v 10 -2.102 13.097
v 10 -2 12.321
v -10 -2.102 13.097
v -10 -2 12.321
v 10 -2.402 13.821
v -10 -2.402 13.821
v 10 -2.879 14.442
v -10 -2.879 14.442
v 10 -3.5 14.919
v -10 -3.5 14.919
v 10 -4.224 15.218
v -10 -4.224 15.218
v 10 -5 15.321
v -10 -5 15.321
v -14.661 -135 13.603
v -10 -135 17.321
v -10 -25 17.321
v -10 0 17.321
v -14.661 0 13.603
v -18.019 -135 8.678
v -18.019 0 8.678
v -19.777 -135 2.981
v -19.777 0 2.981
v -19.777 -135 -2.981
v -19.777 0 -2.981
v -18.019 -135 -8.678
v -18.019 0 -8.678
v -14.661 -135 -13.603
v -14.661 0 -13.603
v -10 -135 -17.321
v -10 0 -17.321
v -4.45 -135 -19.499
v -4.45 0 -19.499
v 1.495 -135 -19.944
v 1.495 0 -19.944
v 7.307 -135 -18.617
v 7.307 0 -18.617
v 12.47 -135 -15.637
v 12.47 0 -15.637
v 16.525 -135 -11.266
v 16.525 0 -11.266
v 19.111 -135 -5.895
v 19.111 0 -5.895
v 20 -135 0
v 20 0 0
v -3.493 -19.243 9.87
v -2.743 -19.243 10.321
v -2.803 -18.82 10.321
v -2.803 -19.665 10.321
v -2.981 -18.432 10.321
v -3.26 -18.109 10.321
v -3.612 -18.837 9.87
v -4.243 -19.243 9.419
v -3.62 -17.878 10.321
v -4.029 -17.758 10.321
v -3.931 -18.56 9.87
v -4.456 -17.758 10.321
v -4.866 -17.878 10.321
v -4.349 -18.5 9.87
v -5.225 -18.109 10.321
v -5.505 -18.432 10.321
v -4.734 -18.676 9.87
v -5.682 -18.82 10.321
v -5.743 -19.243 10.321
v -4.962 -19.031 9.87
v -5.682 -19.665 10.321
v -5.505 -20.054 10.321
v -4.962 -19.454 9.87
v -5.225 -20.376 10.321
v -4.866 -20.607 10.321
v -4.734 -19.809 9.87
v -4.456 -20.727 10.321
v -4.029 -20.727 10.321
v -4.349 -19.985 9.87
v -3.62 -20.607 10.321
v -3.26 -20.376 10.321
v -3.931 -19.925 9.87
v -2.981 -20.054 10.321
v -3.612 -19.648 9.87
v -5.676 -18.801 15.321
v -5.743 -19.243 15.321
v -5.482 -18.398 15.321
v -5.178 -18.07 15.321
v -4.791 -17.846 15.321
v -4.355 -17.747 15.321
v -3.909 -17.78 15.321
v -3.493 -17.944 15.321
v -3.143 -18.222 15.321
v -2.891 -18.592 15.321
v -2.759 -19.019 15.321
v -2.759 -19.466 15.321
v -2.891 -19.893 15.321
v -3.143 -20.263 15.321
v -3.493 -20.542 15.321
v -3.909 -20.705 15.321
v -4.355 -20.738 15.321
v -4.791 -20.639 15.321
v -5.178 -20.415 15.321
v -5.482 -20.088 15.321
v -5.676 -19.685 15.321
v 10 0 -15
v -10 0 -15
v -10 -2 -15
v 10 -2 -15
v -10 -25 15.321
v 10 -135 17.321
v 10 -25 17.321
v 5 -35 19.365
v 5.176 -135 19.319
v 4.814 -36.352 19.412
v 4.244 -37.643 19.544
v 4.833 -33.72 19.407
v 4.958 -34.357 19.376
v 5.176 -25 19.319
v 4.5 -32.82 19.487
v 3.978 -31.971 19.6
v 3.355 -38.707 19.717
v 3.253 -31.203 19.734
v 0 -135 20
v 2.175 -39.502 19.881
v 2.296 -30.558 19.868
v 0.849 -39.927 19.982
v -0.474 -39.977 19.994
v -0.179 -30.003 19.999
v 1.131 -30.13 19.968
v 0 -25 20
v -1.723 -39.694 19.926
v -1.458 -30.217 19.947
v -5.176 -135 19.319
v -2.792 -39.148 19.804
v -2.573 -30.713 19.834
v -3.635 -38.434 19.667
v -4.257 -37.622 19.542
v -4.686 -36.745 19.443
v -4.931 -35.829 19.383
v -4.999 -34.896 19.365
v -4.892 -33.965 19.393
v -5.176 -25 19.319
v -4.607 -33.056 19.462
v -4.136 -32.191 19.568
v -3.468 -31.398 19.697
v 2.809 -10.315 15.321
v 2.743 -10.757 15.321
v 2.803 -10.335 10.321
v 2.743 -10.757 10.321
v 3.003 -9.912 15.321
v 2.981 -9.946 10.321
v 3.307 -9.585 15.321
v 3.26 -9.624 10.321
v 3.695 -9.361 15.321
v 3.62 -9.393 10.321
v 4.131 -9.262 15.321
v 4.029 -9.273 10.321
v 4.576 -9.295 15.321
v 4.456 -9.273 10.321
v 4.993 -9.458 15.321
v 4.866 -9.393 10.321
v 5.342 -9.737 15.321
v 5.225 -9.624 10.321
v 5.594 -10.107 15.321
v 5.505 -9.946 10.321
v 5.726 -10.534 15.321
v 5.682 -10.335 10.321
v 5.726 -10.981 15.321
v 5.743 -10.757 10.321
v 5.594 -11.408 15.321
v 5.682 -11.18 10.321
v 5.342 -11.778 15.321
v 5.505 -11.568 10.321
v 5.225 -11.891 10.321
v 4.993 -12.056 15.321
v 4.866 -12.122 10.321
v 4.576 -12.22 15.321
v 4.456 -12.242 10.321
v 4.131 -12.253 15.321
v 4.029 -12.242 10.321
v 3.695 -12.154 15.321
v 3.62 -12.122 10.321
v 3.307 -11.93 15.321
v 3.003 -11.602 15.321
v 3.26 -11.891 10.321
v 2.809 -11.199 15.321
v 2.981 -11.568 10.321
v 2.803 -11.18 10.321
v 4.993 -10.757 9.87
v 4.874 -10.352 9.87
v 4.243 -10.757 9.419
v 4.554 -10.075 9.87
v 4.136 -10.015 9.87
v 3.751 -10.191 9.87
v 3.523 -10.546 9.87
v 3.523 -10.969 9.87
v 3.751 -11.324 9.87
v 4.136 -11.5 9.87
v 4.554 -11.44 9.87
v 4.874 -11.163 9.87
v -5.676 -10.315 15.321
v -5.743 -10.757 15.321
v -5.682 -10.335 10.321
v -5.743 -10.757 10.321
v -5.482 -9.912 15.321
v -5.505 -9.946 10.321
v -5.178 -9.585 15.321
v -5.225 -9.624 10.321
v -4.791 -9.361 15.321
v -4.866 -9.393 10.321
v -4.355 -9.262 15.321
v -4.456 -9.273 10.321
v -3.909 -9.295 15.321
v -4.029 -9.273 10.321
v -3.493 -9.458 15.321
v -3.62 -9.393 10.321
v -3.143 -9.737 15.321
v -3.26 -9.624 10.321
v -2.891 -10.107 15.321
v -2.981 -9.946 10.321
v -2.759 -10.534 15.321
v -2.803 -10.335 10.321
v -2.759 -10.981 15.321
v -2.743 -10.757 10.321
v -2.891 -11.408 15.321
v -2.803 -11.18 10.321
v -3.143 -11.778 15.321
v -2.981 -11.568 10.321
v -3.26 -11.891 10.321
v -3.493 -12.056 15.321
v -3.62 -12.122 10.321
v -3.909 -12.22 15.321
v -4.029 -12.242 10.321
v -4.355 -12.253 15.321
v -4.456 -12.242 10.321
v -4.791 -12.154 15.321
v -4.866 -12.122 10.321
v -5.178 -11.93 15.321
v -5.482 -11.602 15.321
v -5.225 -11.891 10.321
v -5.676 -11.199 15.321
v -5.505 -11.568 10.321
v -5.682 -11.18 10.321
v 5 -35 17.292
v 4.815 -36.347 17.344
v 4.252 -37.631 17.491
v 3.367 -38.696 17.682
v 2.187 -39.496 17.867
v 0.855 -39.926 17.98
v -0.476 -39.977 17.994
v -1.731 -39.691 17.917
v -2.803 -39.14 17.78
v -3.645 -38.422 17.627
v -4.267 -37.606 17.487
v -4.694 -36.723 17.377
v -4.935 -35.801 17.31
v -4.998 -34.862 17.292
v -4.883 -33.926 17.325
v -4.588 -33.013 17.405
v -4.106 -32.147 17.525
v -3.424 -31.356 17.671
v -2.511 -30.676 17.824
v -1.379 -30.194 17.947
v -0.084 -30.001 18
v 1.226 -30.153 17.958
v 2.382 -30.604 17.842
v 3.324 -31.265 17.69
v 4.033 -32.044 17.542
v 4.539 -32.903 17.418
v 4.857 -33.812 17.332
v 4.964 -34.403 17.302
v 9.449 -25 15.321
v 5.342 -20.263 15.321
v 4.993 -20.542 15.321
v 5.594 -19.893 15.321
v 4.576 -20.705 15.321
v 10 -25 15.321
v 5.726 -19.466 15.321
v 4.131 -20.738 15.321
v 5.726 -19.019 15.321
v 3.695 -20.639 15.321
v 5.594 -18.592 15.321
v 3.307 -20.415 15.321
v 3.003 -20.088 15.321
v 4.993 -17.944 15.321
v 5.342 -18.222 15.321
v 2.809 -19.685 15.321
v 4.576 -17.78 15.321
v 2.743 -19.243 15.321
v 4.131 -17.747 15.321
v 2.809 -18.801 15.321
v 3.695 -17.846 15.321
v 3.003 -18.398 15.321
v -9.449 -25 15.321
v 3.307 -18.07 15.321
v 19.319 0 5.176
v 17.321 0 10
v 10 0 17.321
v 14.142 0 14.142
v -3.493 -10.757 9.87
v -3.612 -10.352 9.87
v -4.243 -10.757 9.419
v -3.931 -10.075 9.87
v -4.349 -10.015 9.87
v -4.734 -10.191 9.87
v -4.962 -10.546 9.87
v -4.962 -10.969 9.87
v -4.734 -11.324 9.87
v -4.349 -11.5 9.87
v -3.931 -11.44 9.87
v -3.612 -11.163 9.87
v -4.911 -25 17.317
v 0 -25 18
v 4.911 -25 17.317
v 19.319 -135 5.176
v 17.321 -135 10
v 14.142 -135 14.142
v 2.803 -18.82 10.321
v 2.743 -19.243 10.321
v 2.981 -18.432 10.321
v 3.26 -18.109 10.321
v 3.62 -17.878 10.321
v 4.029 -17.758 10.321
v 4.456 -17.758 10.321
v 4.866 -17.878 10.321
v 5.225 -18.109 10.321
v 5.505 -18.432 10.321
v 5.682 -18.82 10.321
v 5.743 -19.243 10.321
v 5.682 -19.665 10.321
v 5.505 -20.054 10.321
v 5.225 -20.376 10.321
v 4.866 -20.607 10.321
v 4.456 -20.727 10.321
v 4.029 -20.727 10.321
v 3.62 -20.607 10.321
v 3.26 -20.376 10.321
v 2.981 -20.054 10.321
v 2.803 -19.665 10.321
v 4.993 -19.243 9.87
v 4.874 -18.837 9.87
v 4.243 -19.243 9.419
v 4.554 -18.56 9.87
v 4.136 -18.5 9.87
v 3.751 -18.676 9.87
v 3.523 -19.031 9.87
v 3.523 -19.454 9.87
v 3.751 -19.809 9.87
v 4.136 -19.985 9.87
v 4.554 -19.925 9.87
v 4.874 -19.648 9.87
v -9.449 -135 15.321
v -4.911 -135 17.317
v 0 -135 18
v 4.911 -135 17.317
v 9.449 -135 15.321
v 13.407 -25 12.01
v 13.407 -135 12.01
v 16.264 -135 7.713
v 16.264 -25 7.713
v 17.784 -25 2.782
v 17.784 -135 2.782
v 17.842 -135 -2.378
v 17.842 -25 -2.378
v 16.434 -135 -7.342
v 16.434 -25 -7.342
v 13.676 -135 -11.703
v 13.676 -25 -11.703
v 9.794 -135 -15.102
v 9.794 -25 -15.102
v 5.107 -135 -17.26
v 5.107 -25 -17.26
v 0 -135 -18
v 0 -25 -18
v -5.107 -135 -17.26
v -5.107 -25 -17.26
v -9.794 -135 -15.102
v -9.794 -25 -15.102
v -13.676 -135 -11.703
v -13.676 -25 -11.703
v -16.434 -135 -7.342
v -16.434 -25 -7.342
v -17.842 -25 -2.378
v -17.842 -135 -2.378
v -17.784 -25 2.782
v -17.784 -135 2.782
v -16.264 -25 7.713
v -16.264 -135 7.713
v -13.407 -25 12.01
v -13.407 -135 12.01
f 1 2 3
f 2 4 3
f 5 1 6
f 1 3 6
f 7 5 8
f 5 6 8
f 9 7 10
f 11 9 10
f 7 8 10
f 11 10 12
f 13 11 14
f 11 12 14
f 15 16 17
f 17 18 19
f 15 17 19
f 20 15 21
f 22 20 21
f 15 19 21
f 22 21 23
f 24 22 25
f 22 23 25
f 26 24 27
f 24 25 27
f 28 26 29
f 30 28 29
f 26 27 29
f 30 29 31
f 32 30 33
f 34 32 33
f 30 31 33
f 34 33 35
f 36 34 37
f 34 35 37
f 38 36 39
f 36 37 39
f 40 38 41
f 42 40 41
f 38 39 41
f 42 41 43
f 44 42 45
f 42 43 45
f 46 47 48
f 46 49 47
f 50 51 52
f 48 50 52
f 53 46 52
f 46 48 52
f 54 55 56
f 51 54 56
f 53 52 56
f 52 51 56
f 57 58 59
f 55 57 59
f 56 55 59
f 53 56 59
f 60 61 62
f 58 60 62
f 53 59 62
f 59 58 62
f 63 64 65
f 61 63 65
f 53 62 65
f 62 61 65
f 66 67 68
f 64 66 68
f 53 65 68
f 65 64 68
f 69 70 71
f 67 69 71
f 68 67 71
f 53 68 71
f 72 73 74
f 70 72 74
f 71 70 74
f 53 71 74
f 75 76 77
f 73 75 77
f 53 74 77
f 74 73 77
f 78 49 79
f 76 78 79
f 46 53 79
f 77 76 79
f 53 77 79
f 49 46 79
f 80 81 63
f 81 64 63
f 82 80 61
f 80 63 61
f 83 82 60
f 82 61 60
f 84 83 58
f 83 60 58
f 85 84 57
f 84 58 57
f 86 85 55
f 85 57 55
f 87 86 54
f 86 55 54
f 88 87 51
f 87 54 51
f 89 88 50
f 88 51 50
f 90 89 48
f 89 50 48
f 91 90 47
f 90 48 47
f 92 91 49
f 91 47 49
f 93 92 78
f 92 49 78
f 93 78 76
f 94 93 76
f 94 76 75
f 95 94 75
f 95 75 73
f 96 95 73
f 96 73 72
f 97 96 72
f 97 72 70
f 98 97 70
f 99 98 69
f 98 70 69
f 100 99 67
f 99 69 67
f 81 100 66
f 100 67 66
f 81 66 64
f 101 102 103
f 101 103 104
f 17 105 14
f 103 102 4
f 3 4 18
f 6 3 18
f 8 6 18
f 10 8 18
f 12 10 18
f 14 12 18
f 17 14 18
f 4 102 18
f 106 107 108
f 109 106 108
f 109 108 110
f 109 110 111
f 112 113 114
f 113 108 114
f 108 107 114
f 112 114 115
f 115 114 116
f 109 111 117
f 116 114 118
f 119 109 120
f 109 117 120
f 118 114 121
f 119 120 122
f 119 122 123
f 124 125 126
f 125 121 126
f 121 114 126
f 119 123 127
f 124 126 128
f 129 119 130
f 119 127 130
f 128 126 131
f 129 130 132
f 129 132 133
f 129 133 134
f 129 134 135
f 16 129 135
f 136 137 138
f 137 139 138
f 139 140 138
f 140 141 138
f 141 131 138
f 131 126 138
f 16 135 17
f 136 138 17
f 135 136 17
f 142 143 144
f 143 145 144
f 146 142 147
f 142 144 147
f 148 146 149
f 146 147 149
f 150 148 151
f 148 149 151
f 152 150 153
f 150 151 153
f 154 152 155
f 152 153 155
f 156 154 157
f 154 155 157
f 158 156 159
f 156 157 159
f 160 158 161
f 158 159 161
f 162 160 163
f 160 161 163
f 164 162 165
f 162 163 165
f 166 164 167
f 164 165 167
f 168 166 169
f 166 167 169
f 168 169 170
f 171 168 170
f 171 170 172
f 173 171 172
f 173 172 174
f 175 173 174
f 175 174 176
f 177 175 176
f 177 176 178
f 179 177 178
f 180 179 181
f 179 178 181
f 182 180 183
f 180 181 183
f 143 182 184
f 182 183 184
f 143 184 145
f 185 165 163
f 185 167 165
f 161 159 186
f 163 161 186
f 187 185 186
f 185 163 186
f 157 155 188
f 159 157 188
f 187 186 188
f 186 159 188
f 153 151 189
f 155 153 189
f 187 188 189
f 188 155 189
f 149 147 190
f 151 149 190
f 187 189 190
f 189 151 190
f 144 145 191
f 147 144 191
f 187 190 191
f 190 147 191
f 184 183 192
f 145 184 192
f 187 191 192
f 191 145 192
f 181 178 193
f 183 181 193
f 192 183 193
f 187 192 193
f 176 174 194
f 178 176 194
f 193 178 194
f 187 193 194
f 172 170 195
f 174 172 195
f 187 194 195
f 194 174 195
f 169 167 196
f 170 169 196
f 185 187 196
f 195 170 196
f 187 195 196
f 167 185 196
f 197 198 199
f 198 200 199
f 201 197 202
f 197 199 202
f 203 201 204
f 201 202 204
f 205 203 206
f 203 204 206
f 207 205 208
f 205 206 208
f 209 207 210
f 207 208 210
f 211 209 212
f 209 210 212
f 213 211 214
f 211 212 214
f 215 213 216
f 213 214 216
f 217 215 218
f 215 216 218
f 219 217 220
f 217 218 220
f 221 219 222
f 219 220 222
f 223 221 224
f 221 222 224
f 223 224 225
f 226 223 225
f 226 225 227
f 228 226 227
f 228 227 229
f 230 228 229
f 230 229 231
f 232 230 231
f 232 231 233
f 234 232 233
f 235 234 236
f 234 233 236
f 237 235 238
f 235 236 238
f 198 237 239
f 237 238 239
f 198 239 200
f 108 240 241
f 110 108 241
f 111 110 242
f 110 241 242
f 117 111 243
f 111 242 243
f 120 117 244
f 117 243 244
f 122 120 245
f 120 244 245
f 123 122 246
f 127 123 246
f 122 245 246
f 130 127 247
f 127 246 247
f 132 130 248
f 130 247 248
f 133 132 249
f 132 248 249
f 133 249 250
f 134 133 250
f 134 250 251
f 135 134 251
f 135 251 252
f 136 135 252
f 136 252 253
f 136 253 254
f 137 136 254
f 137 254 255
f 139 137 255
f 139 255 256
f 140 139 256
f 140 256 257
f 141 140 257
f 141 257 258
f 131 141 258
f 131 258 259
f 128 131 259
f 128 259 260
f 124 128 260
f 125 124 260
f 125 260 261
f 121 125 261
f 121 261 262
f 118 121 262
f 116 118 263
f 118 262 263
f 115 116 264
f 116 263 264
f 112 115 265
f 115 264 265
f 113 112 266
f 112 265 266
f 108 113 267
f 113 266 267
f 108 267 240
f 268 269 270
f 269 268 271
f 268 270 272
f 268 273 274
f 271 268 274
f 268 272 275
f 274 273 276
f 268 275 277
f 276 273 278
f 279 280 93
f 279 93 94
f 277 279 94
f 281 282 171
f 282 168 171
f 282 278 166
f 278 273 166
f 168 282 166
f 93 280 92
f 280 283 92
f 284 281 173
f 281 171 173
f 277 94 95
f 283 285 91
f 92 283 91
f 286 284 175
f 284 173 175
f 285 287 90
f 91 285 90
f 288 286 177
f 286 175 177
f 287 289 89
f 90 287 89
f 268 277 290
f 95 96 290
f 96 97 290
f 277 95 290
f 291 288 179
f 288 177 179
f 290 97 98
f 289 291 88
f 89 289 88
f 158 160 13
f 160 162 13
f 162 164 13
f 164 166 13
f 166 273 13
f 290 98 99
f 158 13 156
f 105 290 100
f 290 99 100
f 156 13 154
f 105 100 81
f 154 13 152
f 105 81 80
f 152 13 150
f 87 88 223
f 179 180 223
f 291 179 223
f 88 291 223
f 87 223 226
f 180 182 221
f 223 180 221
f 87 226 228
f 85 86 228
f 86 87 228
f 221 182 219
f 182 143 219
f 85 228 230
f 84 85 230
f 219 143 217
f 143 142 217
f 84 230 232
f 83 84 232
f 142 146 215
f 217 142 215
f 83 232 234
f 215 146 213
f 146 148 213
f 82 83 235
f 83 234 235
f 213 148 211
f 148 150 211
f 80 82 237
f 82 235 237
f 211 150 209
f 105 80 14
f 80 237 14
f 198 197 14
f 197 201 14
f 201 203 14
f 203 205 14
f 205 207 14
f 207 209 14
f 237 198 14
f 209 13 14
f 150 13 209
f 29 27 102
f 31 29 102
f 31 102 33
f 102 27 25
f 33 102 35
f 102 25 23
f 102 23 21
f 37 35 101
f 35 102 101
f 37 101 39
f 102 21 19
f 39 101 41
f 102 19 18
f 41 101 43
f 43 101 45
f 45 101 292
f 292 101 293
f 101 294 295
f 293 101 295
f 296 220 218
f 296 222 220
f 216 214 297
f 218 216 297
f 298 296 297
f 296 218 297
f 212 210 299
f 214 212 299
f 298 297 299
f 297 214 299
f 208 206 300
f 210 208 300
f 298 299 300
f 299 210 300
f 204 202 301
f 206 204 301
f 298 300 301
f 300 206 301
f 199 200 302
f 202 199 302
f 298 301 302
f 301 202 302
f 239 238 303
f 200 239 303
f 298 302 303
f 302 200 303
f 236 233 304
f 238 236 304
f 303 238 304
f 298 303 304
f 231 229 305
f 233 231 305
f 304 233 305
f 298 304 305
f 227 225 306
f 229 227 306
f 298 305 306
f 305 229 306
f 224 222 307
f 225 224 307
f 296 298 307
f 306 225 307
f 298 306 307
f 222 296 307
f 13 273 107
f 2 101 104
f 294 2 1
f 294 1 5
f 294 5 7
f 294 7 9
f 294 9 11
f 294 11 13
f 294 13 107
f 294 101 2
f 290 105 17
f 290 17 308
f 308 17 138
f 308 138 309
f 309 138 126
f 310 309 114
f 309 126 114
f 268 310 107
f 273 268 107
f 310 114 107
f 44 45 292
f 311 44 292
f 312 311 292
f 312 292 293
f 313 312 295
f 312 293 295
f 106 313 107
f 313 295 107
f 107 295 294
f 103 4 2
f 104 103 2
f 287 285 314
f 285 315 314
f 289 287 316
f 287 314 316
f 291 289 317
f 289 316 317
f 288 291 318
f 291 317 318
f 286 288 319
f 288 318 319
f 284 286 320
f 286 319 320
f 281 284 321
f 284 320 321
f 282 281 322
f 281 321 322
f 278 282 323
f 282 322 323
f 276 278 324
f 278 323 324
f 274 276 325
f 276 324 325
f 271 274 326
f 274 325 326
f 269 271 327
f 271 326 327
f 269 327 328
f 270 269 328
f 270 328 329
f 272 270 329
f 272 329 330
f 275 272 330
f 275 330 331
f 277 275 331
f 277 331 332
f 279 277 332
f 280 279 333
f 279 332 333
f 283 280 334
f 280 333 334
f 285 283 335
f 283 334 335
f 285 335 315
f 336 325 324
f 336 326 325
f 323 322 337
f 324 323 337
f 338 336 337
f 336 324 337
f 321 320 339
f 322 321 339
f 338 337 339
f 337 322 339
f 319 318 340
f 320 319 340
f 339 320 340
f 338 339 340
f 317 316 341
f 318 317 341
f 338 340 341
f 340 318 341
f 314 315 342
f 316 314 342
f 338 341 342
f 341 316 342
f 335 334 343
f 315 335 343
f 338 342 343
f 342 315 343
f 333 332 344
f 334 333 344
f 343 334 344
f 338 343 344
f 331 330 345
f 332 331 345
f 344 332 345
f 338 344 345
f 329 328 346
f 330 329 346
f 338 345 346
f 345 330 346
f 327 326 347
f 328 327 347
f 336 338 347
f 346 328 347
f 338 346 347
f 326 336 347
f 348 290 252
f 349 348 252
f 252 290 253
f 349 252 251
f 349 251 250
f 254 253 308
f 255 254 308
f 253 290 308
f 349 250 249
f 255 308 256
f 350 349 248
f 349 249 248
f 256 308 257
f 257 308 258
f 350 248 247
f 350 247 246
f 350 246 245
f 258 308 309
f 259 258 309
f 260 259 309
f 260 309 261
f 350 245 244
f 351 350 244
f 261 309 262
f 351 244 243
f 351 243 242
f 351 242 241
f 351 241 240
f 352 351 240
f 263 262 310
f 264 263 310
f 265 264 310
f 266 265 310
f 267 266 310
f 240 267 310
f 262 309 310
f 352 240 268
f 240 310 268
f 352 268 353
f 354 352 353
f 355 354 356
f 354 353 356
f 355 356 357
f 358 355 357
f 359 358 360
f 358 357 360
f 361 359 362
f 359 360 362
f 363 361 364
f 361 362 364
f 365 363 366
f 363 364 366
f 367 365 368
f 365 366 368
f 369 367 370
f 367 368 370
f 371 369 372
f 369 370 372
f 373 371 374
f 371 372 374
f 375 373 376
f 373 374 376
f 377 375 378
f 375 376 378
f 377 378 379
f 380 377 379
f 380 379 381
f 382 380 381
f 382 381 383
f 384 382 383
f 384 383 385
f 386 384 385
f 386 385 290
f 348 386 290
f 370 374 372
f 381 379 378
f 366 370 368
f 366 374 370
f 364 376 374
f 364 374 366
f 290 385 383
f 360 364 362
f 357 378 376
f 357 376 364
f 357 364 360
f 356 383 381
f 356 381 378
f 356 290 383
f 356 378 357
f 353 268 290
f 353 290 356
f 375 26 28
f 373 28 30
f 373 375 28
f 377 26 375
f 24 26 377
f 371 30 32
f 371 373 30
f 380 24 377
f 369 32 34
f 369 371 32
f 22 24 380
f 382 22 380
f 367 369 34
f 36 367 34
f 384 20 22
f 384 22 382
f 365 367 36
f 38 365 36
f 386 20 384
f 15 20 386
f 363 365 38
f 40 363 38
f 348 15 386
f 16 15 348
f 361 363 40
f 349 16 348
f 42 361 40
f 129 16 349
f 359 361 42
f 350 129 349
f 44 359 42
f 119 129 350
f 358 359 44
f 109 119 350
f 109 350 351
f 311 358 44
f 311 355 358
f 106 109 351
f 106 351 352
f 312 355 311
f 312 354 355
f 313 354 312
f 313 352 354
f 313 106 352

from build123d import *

# Parameters (mm, degrees)
F1_DEPTH = 135
F2_START = 25
F2_DEPTH = 110
F0_R     = 13.5
F3_DEPTH = 25
F4_W     = 20
F4_H     = 36.2463506984
F5_DEPTH = 2
F7_D     = 3
F7_DEPTH = 5
F7_TIP   = 0.9012909285
F9_D     = 10
F9_DEPTH = 20.001
F10_R    = 3


with BuildPart() as f1:
    # F0 (on Front) → F1 (new body)
    with BuildSketch(Plane.XZ):
        with BuildLine():
            ThreePointArc((-10, 17.3205080757), (-10, -17.3205080757), (20, 0))
            ThreePointArc((20, 0), (17.3205080757, 10), (10, 17.3205080757))
            Line((10, 17.3205080757), (10, 15.3205080757))
            Line((10, 15.3205080757), (9.448916991, 15.3205080757))
            ThreePointArc((9.448916991, 15.3205080757), (15.7175142093, 8.7726704646), (18, 0))
            ThreePointArc((18, 0), (-8.7726704646, -15.7175142093), (-9.448916991, 15.3205080757))
            Line((-9.448916991, 15.3205080757), (-10, 15.3205080757))
            Line((-10, 15.3205080757), (-10, 17.3205080757))
        make_face()
    extrude(amount=F1_DEPTH)

    # F0 (on Front) → F2 (join)
    with BuildSketch(Plane.XZ.offset(F2_START)):
        with BuildLine():
            Line((10, 15.3205080757), (10, 17.3205080757))
            ThreePointArc((10, 17.3205080757), (0, 20), (-10, 17.3205080757))
            Line((-10, 17.3205080757), (-10, 15.3205080757))
            Line((-10, 15.3205080757), (-9.448916991, 15.3205080757))
            ThreePointArc((-9.448916991, 15.3205080757), (0, 18), (9.448916991, 15.3205080757))
            Line((9.448916991, 15.3205080757), (10, 15.3205080757))
        make_face()
    extrude(amount=F2_DEPTH)

    # F0 (on Front) → F3 (join)
    with BuildSketch(Plane.XZ):
        with BuildLine():
            ThreePointArc((18, 0), (15.7175142093, 8.7726704646), (9.448916991, 15.3205080757))
            Line((9.448916991, 15.3205080757), (-9.448916991, 15.3205080757))
            ThreePointArc((-9.448916991, 15.3205080757), (-8.7726704646, -15.7175142093), (18, 0))
        make_face()
        Circle(F0_R, mode=Mode.SUBTRACT)
        Circle(F0_R)
    extrude(amount=F3_DEPTH)

    # F4 (on Front) → F5 (cut)
    with BuildSketch(Plane.XZ):
        with Locations((0, 3.1231753492)):
            Rectangle(F4_W, F4_H)
    extrude(amount=F5_DEPTH, mode=Mode.SUBTRACT)

    # F7
    with Locations(Plane.XY.offset(15.3205080757)):
        with Locations((4.2426406871, -10.7573593129), (-4.2426406871, -10.7573593129), (-4.2426406871, -19.2426406871), (4.2426406871, -19.2426406871)):
            Hole(F7_D / 2, depth=F7_DEPTH)
            with Locations((0, 0, -(F7_DEPTH + F7_TIP / 2))):  # 118° drill point
                Cone(0, F7_D / 2, F7_TIP, mode=Mode.SUBTRACT)

    # F9 (through all, one way)
    with BuildSketch(Plane(origin=(0, 0, 0), x_dir=(1, 0, 0), z_dir=(0, 0, -1))):
        with Locations((0, 35)):
            Circle(F9_D / 2)
    extrude(amount=-F9_DEPTH, mode=Mode.SUBTRACT)

    # F10
    f10_edges = [f1.edges().sort_by_distance(p)[0] for p in [
        (0, -2, 15.320508),
    ]]
    fillet(f10_edges, radius=F10_R)


solid = f1.part
